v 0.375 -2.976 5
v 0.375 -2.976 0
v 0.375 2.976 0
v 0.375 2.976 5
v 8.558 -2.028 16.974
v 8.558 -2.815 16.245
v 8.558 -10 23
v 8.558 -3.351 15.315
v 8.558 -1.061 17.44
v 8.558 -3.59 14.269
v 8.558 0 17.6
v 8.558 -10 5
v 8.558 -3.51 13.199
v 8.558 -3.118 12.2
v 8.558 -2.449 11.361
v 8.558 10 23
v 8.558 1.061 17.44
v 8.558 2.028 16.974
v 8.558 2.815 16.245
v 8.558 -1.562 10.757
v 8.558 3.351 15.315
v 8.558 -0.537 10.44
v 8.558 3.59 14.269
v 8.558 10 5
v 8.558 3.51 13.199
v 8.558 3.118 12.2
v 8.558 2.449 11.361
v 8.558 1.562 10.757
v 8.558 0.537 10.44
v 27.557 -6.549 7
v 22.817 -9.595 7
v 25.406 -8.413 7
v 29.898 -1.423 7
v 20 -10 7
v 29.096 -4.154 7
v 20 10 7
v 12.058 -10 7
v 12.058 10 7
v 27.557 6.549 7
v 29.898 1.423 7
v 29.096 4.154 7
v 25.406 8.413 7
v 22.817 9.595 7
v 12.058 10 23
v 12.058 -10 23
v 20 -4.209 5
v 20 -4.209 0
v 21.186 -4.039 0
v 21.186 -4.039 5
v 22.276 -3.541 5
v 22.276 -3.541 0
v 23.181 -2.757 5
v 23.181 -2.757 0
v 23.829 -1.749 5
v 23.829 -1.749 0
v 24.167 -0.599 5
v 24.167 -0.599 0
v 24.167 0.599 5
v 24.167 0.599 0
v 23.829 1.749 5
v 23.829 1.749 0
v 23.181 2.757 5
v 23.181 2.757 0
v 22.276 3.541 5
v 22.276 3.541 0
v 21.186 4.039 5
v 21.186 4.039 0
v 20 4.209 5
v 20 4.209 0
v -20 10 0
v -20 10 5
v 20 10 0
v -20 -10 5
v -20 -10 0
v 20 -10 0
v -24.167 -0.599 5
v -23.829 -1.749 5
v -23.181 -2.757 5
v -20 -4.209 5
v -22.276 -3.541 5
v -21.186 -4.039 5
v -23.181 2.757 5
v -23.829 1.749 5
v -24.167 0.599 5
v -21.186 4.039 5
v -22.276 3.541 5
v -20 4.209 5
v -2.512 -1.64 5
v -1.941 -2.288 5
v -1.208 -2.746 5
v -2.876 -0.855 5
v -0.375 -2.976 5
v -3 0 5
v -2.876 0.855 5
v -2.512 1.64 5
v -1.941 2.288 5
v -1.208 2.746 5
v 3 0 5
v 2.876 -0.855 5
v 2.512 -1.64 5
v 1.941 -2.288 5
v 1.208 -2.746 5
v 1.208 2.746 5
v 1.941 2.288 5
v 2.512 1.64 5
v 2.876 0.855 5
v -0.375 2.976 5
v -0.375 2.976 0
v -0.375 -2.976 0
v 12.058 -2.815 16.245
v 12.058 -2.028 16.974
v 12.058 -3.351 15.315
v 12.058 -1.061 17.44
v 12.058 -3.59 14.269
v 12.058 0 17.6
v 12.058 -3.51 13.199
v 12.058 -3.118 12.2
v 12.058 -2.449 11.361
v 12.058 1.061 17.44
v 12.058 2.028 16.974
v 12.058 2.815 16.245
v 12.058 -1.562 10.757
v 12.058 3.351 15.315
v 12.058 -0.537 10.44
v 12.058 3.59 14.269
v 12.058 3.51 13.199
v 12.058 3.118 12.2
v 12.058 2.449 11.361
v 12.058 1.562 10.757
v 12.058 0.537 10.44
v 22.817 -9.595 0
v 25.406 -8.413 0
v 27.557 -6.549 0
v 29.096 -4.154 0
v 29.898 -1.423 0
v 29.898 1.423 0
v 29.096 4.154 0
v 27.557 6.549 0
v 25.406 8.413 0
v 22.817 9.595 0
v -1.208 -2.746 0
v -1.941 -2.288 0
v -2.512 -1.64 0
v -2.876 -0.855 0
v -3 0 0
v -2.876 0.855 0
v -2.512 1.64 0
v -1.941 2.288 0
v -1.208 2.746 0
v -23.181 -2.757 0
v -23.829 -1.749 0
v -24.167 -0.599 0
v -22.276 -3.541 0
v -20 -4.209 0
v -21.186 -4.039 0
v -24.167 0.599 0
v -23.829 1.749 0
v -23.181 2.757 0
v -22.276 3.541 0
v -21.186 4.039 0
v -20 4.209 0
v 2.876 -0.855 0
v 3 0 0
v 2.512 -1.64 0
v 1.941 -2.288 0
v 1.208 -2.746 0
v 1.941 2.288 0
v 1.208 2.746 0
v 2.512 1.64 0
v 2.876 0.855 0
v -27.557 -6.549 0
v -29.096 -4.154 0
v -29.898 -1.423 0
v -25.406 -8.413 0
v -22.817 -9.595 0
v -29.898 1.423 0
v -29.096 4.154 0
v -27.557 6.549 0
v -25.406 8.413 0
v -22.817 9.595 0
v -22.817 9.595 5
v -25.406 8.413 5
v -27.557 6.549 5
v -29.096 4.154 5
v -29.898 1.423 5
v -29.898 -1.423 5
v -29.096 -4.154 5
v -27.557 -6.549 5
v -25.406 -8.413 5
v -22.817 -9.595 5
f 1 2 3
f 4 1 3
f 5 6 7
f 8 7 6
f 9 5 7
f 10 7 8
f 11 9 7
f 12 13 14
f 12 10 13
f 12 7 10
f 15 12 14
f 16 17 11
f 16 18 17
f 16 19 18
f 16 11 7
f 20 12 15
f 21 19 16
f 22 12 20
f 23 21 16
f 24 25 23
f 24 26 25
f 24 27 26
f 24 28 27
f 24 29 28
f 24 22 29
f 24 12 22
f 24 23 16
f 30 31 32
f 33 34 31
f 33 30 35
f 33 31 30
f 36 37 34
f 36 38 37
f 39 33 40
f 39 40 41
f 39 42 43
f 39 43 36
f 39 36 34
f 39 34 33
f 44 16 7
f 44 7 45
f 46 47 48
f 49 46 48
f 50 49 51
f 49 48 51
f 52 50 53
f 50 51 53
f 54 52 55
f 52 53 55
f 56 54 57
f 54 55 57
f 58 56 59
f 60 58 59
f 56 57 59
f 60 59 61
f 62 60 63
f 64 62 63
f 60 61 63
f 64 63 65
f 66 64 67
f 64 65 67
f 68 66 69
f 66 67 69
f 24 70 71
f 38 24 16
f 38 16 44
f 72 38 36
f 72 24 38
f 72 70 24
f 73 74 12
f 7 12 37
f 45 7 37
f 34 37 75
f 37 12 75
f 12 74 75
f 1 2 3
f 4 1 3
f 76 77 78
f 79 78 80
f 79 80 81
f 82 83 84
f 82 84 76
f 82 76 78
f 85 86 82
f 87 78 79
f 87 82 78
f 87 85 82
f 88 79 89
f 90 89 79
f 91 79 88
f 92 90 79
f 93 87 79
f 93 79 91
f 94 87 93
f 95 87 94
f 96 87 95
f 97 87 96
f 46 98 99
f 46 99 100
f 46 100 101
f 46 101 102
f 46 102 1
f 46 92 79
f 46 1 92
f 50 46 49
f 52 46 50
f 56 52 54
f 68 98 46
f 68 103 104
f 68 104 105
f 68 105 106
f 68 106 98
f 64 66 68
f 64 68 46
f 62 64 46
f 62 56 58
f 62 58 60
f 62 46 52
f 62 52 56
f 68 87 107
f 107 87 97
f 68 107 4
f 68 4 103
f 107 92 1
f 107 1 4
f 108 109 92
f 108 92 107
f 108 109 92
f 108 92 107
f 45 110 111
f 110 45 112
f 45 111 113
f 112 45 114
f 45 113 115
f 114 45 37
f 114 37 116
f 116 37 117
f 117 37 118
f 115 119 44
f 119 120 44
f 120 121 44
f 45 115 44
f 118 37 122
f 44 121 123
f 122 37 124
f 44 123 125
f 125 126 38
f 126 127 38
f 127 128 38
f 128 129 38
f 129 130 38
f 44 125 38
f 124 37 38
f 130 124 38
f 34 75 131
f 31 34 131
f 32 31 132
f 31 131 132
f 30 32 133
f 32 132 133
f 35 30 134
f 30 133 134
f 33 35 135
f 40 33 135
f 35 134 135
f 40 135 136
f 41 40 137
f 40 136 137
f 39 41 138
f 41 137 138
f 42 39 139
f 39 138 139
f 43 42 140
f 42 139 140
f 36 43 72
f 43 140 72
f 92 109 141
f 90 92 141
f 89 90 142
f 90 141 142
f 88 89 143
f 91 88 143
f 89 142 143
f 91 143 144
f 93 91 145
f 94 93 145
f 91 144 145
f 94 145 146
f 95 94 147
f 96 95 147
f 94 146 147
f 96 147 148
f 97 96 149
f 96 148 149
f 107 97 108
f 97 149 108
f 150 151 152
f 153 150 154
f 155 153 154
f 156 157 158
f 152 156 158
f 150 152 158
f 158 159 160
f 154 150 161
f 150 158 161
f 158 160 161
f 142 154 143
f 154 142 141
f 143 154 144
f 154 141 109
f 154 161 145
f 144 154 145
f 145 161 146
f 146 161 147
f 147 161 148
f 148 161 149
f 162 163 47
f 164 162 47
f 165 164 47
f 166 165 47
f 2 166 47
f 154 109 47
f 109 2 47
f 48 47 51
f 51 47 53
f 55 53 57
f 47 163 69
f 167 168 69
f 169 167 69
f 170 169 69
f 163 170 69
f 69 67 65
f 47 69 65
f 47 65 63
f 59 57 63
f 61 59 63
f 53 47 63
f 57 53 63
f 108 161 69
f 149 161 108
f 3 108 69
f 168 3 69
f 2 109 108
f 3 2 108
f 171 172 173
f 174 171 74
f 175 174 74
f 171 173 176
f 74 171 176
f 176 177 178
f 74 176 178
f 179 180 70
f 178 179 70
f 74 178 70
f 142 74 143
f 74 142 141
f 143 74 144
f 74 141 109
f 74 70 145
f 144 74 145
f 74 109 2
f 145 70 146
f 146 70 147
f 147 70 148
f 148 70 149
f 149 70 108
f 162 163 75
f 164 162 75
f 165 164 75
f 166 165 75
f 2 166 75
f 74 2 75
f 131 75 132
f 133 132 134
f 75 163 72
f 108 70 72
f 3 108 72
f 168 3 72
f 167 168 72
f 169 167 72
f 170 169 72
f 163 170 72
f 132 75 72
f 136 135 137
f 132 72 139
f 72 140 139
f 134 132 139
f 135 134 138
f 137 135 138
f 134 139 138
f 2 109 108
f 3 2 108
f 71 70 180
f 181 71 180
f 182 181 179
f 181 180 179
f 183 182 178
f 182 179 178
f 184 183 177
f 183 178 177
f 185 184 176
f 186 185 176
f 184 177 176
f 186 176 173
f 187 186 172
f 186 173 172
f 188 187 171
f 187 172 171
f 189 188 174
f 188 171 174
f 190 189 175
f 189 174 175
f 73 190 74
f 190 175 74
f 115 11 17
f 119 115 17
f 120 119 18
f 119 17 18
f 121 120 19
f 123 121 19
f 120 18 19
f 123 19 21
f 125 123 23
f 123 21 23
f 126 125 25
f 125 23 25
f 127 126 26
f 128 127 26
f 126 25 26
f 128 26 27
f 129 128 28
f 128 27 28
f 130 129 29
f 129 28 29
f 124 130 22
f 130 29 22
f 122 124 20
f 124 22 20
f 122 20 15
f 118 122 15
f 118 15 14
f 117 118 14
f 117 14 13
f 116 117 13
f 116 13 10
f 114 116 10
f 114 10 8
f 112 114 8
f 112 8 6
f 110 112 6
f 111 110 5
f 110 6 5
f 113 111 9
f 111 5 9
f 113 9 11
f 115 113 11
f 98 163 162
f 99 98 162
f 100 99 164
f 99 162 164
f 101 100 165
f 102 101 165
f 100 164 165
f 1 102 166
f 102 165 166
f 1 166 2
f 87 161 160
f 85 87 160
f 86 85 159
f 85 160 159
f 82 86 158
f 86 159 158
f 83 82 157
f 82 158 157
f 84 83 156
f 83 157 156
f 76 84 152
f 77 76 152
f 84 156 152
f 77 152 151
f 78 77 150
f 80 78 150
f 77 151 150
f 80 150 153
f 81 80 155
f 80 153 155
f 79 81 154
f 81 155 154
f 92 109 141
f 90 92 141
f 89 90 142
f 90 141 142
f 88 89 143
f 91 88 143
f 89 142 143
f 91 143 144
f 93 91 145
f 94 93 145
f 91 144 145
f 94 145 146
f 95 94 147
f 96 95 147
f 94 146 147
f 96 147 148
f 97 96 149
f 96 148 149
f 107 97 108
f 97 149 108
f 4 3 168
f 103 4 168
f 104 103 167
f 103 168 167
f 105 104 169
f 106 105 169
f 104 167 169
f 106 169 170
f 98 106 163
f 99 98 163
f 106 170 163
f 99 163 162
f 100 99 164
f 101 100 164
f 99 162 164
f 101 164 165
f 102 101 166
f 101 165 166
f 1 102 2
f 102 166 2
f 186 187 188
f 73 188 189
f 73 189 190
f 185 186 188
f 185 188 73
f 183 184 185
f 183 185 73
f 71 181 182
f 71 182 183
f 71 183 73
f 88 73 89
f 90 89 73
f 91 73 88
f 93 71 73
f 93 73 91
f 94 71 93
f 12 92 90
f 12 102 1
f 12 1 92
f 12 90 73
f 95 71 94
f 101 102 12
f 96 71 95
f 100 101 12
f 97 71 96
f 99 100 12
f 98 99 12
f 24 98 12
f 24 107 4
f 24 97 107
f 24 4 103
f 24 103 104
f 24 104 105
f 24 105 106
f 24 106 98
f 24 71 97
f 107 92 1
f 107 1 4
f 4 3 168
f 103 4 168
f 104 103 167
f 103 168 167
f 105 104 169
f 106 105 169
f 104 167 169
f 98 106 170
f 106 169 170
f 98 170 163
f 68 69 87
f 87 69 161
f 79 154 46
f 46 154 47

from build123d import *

# Parameters (mm, degrees)
EXTRUDE_1_DEPTH       = 5
SKETCH_1_3_W          = 0.75
SKETCH_1_3_H          = 6
EXTRUDE_2_DEPTH       = 5
EXTRUDE_10_DEPTH      = 5
EXTRUDE_16_DEPTH      = 5
EXTRUDE_18_DEPTH      = 18
EXTRUDE_18_DEPTH_BACK = 5
SKETCH_2_W            = 3.5
SKETCH_2_H            = 20
SKETCH_3_R            = 3.6
CUT_EXTRUDE_2_DEPTH   = 3.5
SKETCH_4_R            = 10
SKETCH_4_W            = 7.941870484
SKETCH_4_H            = 20
EXTRUDE_21_DEPTH      = 2
SKETCH_1_20_W         = 0.75
SKETCH_1_20_H         = 6
EXTRUDE_23_DEPTH      = 5


# Read off the part's stored shape, not the designer's step: 凸台-拉伸10
with BuildPart() as part:
    # 草图1 → 凸台-拉伸1 (new body)
    with BuildSketch(Plane.XY):
        with BuildLine():
            Line((-20, -4.209395136), (20, -4.209395136))
            ThreePointArc((20, -4.209395136), (24.209395136, 0), (20, 4.209395136))
            Line((20, 4.209395136), (-20, 4.209395136))
            ThreePointArc((-20, 4.209395136), (-24.209395136, 0), (-20, -4.209395136))
        make_face()
        with BuildLine():
            Line((6e-09, -3), (-0.375, -3))
            Line((-0.375, -3), (-0.375, -2.976470225))
            ThreePointArc((-0.375, -2.976470225), (-3, 0), (-0.375, 2.976470225))
            Line((-0.375, 2.976470225), (-0.375, 3))
            Line((-0.375, 3), (0, 3))
            Line((0, 3), (0.375, 3))
            Line((0.375, 3), (0.375, 2.976470225))
            ThreePointArc((0.375, 2.976470225), (2.25, 1.984313483), (3, 0))
            ThreePointArc((3, 0), (2.25, -1.984313483), (0.375, -2.976470225))
            Line((0.375, -2.976470225), (0.375, -3))
            Line((0.375, -3), (6e-09, -3))
        make_face(mode=Mode.SUBTRACT)
    extrude(amount=EXTRUDE_1_DEPTH)

    # 草图1<3> → 凸台-拉伸2 (add)
    with BuildSketch(Plane.XY):
        Rectangle(SKETCH_1_3_W, SKETCH_1_3_H)
    extrude(amount=EXTRUDE_2_DEPTH)


with BuildPart() as body_2:
    # 凸台-拉伸10 outline → 凸台-拉伸10 (new body)
    with BuildSketch(Plane.XY):
        with BuildLine():
            Line((20, 4.209395136), (-20, 4.209395136))
            ThreePointArc((-20, 4.209395136), (-24.209395136, 0), (-20, -4.209395136))
            Line((-20, -4.209395136), (20, -4.209395136))
            ThreePointArc((20, -4.209395136), (24.209395136, 0), (20, 4.209395136))
        make_face()
        with BuildLine():
            Line((-0.375, -3), (-0.375, -2.976470225))
            ThreePointArc((-0.375, -2.976470225), (-3, 0), (-0.375, 2.976470225))
            Line((-0.375, 2.976470225), (-0.375, 3))
            Line((-0.375, 3), (0.375, 3))
            Line((0.375, 3), (0.375, 2.976470225))
            ThreePointArc((0.375, 2.976470225), (3, 0), (0.375, -2.976470225))
            Line((0.375, -2.976470225), (0.375, -3))
            Line((0.375, -3), (-0.375, -3))
        make_face(mode=Mode.SUBTRACT)
    extrude(amount=EXTRUDE_10_DEPTH)

    # 草图1<15> → 凸台-拉伸16 (add)
    with BuildSketch(Plane.XY):
        with BuildLine():
            Line((-20, -10), (20, -10))
            ThreePointArc((20, -10), (30, 0), (20, 10))
            Line((20, 10), (-20, 10))
            ThreePointArc((-20, 10), (-30, 0), (-20, -10))
        make_face()
        with BuildLine():
            ThreePointArc((-20, 4.209395136), (-24.209395136, 0), (-20, -4.209395136))
            Line((-20, -4.209395136), (20, -4.209395136))
            ThreePointArc((20, -4.209395136), (24.209395136, 0), (20, 4.209395136))
            Line((20, 4.209395136), (-20, 4.209395136))
        make_face(mode=Mode.SUBTRACT)
    extrude(amount=EXTRUDE_16_DEPTH)

    # 草图2 → 凸台-拉伸18 (add, two sides: drawn at the far end of the back side and taken through both)
    with BuildSketch(Plane.XY.offset(5).offset(-EXTRUDE_18_DEPTH_BACK)):
        with Locations((10.308129516, 0)):
            Rectangle(SKETCH_2_W, SKETCH_2_H)
    extrude(amount=EXTRUDE_18_DEPTH + EXTRUDE_18_DEPTH_BACK)

    # 草图3 → 切除-拉伸2 (cut)
    with BuildSketch(Plane.ZY.offset(-8.558129516)):
        with Locations((14, 0)):
            Circle(SKETCH_3_R)
    extrude(amount=-CUT_EXTRUDE_2_DEPTH, mode=Mode.SUBTRACT)

    # 草图4 → 凸台-拉伸21 (add)
    with BuildSketch(Plane.XY.offset(5)):
        with Locations((20, 0)):
            Circle(SKETCH_4_R)
        with Locations((16.029064758, 0)):
            Rectangle(SKETCH_4_W, SKETCH_4_H)
    extrude(amount=EXTRUDE_21_DEPTH)

    # 草图1<20> → 凸台-拉伸23 (add)
    with BuildSketch(Plane.XY):
        Rectangle(SKETCH_1_20_W, SKETCH_1_20_H)
    extrude(amount=EXTRUDE_23_DEPTH)


solid = Compound([part.part, body_2.part])
